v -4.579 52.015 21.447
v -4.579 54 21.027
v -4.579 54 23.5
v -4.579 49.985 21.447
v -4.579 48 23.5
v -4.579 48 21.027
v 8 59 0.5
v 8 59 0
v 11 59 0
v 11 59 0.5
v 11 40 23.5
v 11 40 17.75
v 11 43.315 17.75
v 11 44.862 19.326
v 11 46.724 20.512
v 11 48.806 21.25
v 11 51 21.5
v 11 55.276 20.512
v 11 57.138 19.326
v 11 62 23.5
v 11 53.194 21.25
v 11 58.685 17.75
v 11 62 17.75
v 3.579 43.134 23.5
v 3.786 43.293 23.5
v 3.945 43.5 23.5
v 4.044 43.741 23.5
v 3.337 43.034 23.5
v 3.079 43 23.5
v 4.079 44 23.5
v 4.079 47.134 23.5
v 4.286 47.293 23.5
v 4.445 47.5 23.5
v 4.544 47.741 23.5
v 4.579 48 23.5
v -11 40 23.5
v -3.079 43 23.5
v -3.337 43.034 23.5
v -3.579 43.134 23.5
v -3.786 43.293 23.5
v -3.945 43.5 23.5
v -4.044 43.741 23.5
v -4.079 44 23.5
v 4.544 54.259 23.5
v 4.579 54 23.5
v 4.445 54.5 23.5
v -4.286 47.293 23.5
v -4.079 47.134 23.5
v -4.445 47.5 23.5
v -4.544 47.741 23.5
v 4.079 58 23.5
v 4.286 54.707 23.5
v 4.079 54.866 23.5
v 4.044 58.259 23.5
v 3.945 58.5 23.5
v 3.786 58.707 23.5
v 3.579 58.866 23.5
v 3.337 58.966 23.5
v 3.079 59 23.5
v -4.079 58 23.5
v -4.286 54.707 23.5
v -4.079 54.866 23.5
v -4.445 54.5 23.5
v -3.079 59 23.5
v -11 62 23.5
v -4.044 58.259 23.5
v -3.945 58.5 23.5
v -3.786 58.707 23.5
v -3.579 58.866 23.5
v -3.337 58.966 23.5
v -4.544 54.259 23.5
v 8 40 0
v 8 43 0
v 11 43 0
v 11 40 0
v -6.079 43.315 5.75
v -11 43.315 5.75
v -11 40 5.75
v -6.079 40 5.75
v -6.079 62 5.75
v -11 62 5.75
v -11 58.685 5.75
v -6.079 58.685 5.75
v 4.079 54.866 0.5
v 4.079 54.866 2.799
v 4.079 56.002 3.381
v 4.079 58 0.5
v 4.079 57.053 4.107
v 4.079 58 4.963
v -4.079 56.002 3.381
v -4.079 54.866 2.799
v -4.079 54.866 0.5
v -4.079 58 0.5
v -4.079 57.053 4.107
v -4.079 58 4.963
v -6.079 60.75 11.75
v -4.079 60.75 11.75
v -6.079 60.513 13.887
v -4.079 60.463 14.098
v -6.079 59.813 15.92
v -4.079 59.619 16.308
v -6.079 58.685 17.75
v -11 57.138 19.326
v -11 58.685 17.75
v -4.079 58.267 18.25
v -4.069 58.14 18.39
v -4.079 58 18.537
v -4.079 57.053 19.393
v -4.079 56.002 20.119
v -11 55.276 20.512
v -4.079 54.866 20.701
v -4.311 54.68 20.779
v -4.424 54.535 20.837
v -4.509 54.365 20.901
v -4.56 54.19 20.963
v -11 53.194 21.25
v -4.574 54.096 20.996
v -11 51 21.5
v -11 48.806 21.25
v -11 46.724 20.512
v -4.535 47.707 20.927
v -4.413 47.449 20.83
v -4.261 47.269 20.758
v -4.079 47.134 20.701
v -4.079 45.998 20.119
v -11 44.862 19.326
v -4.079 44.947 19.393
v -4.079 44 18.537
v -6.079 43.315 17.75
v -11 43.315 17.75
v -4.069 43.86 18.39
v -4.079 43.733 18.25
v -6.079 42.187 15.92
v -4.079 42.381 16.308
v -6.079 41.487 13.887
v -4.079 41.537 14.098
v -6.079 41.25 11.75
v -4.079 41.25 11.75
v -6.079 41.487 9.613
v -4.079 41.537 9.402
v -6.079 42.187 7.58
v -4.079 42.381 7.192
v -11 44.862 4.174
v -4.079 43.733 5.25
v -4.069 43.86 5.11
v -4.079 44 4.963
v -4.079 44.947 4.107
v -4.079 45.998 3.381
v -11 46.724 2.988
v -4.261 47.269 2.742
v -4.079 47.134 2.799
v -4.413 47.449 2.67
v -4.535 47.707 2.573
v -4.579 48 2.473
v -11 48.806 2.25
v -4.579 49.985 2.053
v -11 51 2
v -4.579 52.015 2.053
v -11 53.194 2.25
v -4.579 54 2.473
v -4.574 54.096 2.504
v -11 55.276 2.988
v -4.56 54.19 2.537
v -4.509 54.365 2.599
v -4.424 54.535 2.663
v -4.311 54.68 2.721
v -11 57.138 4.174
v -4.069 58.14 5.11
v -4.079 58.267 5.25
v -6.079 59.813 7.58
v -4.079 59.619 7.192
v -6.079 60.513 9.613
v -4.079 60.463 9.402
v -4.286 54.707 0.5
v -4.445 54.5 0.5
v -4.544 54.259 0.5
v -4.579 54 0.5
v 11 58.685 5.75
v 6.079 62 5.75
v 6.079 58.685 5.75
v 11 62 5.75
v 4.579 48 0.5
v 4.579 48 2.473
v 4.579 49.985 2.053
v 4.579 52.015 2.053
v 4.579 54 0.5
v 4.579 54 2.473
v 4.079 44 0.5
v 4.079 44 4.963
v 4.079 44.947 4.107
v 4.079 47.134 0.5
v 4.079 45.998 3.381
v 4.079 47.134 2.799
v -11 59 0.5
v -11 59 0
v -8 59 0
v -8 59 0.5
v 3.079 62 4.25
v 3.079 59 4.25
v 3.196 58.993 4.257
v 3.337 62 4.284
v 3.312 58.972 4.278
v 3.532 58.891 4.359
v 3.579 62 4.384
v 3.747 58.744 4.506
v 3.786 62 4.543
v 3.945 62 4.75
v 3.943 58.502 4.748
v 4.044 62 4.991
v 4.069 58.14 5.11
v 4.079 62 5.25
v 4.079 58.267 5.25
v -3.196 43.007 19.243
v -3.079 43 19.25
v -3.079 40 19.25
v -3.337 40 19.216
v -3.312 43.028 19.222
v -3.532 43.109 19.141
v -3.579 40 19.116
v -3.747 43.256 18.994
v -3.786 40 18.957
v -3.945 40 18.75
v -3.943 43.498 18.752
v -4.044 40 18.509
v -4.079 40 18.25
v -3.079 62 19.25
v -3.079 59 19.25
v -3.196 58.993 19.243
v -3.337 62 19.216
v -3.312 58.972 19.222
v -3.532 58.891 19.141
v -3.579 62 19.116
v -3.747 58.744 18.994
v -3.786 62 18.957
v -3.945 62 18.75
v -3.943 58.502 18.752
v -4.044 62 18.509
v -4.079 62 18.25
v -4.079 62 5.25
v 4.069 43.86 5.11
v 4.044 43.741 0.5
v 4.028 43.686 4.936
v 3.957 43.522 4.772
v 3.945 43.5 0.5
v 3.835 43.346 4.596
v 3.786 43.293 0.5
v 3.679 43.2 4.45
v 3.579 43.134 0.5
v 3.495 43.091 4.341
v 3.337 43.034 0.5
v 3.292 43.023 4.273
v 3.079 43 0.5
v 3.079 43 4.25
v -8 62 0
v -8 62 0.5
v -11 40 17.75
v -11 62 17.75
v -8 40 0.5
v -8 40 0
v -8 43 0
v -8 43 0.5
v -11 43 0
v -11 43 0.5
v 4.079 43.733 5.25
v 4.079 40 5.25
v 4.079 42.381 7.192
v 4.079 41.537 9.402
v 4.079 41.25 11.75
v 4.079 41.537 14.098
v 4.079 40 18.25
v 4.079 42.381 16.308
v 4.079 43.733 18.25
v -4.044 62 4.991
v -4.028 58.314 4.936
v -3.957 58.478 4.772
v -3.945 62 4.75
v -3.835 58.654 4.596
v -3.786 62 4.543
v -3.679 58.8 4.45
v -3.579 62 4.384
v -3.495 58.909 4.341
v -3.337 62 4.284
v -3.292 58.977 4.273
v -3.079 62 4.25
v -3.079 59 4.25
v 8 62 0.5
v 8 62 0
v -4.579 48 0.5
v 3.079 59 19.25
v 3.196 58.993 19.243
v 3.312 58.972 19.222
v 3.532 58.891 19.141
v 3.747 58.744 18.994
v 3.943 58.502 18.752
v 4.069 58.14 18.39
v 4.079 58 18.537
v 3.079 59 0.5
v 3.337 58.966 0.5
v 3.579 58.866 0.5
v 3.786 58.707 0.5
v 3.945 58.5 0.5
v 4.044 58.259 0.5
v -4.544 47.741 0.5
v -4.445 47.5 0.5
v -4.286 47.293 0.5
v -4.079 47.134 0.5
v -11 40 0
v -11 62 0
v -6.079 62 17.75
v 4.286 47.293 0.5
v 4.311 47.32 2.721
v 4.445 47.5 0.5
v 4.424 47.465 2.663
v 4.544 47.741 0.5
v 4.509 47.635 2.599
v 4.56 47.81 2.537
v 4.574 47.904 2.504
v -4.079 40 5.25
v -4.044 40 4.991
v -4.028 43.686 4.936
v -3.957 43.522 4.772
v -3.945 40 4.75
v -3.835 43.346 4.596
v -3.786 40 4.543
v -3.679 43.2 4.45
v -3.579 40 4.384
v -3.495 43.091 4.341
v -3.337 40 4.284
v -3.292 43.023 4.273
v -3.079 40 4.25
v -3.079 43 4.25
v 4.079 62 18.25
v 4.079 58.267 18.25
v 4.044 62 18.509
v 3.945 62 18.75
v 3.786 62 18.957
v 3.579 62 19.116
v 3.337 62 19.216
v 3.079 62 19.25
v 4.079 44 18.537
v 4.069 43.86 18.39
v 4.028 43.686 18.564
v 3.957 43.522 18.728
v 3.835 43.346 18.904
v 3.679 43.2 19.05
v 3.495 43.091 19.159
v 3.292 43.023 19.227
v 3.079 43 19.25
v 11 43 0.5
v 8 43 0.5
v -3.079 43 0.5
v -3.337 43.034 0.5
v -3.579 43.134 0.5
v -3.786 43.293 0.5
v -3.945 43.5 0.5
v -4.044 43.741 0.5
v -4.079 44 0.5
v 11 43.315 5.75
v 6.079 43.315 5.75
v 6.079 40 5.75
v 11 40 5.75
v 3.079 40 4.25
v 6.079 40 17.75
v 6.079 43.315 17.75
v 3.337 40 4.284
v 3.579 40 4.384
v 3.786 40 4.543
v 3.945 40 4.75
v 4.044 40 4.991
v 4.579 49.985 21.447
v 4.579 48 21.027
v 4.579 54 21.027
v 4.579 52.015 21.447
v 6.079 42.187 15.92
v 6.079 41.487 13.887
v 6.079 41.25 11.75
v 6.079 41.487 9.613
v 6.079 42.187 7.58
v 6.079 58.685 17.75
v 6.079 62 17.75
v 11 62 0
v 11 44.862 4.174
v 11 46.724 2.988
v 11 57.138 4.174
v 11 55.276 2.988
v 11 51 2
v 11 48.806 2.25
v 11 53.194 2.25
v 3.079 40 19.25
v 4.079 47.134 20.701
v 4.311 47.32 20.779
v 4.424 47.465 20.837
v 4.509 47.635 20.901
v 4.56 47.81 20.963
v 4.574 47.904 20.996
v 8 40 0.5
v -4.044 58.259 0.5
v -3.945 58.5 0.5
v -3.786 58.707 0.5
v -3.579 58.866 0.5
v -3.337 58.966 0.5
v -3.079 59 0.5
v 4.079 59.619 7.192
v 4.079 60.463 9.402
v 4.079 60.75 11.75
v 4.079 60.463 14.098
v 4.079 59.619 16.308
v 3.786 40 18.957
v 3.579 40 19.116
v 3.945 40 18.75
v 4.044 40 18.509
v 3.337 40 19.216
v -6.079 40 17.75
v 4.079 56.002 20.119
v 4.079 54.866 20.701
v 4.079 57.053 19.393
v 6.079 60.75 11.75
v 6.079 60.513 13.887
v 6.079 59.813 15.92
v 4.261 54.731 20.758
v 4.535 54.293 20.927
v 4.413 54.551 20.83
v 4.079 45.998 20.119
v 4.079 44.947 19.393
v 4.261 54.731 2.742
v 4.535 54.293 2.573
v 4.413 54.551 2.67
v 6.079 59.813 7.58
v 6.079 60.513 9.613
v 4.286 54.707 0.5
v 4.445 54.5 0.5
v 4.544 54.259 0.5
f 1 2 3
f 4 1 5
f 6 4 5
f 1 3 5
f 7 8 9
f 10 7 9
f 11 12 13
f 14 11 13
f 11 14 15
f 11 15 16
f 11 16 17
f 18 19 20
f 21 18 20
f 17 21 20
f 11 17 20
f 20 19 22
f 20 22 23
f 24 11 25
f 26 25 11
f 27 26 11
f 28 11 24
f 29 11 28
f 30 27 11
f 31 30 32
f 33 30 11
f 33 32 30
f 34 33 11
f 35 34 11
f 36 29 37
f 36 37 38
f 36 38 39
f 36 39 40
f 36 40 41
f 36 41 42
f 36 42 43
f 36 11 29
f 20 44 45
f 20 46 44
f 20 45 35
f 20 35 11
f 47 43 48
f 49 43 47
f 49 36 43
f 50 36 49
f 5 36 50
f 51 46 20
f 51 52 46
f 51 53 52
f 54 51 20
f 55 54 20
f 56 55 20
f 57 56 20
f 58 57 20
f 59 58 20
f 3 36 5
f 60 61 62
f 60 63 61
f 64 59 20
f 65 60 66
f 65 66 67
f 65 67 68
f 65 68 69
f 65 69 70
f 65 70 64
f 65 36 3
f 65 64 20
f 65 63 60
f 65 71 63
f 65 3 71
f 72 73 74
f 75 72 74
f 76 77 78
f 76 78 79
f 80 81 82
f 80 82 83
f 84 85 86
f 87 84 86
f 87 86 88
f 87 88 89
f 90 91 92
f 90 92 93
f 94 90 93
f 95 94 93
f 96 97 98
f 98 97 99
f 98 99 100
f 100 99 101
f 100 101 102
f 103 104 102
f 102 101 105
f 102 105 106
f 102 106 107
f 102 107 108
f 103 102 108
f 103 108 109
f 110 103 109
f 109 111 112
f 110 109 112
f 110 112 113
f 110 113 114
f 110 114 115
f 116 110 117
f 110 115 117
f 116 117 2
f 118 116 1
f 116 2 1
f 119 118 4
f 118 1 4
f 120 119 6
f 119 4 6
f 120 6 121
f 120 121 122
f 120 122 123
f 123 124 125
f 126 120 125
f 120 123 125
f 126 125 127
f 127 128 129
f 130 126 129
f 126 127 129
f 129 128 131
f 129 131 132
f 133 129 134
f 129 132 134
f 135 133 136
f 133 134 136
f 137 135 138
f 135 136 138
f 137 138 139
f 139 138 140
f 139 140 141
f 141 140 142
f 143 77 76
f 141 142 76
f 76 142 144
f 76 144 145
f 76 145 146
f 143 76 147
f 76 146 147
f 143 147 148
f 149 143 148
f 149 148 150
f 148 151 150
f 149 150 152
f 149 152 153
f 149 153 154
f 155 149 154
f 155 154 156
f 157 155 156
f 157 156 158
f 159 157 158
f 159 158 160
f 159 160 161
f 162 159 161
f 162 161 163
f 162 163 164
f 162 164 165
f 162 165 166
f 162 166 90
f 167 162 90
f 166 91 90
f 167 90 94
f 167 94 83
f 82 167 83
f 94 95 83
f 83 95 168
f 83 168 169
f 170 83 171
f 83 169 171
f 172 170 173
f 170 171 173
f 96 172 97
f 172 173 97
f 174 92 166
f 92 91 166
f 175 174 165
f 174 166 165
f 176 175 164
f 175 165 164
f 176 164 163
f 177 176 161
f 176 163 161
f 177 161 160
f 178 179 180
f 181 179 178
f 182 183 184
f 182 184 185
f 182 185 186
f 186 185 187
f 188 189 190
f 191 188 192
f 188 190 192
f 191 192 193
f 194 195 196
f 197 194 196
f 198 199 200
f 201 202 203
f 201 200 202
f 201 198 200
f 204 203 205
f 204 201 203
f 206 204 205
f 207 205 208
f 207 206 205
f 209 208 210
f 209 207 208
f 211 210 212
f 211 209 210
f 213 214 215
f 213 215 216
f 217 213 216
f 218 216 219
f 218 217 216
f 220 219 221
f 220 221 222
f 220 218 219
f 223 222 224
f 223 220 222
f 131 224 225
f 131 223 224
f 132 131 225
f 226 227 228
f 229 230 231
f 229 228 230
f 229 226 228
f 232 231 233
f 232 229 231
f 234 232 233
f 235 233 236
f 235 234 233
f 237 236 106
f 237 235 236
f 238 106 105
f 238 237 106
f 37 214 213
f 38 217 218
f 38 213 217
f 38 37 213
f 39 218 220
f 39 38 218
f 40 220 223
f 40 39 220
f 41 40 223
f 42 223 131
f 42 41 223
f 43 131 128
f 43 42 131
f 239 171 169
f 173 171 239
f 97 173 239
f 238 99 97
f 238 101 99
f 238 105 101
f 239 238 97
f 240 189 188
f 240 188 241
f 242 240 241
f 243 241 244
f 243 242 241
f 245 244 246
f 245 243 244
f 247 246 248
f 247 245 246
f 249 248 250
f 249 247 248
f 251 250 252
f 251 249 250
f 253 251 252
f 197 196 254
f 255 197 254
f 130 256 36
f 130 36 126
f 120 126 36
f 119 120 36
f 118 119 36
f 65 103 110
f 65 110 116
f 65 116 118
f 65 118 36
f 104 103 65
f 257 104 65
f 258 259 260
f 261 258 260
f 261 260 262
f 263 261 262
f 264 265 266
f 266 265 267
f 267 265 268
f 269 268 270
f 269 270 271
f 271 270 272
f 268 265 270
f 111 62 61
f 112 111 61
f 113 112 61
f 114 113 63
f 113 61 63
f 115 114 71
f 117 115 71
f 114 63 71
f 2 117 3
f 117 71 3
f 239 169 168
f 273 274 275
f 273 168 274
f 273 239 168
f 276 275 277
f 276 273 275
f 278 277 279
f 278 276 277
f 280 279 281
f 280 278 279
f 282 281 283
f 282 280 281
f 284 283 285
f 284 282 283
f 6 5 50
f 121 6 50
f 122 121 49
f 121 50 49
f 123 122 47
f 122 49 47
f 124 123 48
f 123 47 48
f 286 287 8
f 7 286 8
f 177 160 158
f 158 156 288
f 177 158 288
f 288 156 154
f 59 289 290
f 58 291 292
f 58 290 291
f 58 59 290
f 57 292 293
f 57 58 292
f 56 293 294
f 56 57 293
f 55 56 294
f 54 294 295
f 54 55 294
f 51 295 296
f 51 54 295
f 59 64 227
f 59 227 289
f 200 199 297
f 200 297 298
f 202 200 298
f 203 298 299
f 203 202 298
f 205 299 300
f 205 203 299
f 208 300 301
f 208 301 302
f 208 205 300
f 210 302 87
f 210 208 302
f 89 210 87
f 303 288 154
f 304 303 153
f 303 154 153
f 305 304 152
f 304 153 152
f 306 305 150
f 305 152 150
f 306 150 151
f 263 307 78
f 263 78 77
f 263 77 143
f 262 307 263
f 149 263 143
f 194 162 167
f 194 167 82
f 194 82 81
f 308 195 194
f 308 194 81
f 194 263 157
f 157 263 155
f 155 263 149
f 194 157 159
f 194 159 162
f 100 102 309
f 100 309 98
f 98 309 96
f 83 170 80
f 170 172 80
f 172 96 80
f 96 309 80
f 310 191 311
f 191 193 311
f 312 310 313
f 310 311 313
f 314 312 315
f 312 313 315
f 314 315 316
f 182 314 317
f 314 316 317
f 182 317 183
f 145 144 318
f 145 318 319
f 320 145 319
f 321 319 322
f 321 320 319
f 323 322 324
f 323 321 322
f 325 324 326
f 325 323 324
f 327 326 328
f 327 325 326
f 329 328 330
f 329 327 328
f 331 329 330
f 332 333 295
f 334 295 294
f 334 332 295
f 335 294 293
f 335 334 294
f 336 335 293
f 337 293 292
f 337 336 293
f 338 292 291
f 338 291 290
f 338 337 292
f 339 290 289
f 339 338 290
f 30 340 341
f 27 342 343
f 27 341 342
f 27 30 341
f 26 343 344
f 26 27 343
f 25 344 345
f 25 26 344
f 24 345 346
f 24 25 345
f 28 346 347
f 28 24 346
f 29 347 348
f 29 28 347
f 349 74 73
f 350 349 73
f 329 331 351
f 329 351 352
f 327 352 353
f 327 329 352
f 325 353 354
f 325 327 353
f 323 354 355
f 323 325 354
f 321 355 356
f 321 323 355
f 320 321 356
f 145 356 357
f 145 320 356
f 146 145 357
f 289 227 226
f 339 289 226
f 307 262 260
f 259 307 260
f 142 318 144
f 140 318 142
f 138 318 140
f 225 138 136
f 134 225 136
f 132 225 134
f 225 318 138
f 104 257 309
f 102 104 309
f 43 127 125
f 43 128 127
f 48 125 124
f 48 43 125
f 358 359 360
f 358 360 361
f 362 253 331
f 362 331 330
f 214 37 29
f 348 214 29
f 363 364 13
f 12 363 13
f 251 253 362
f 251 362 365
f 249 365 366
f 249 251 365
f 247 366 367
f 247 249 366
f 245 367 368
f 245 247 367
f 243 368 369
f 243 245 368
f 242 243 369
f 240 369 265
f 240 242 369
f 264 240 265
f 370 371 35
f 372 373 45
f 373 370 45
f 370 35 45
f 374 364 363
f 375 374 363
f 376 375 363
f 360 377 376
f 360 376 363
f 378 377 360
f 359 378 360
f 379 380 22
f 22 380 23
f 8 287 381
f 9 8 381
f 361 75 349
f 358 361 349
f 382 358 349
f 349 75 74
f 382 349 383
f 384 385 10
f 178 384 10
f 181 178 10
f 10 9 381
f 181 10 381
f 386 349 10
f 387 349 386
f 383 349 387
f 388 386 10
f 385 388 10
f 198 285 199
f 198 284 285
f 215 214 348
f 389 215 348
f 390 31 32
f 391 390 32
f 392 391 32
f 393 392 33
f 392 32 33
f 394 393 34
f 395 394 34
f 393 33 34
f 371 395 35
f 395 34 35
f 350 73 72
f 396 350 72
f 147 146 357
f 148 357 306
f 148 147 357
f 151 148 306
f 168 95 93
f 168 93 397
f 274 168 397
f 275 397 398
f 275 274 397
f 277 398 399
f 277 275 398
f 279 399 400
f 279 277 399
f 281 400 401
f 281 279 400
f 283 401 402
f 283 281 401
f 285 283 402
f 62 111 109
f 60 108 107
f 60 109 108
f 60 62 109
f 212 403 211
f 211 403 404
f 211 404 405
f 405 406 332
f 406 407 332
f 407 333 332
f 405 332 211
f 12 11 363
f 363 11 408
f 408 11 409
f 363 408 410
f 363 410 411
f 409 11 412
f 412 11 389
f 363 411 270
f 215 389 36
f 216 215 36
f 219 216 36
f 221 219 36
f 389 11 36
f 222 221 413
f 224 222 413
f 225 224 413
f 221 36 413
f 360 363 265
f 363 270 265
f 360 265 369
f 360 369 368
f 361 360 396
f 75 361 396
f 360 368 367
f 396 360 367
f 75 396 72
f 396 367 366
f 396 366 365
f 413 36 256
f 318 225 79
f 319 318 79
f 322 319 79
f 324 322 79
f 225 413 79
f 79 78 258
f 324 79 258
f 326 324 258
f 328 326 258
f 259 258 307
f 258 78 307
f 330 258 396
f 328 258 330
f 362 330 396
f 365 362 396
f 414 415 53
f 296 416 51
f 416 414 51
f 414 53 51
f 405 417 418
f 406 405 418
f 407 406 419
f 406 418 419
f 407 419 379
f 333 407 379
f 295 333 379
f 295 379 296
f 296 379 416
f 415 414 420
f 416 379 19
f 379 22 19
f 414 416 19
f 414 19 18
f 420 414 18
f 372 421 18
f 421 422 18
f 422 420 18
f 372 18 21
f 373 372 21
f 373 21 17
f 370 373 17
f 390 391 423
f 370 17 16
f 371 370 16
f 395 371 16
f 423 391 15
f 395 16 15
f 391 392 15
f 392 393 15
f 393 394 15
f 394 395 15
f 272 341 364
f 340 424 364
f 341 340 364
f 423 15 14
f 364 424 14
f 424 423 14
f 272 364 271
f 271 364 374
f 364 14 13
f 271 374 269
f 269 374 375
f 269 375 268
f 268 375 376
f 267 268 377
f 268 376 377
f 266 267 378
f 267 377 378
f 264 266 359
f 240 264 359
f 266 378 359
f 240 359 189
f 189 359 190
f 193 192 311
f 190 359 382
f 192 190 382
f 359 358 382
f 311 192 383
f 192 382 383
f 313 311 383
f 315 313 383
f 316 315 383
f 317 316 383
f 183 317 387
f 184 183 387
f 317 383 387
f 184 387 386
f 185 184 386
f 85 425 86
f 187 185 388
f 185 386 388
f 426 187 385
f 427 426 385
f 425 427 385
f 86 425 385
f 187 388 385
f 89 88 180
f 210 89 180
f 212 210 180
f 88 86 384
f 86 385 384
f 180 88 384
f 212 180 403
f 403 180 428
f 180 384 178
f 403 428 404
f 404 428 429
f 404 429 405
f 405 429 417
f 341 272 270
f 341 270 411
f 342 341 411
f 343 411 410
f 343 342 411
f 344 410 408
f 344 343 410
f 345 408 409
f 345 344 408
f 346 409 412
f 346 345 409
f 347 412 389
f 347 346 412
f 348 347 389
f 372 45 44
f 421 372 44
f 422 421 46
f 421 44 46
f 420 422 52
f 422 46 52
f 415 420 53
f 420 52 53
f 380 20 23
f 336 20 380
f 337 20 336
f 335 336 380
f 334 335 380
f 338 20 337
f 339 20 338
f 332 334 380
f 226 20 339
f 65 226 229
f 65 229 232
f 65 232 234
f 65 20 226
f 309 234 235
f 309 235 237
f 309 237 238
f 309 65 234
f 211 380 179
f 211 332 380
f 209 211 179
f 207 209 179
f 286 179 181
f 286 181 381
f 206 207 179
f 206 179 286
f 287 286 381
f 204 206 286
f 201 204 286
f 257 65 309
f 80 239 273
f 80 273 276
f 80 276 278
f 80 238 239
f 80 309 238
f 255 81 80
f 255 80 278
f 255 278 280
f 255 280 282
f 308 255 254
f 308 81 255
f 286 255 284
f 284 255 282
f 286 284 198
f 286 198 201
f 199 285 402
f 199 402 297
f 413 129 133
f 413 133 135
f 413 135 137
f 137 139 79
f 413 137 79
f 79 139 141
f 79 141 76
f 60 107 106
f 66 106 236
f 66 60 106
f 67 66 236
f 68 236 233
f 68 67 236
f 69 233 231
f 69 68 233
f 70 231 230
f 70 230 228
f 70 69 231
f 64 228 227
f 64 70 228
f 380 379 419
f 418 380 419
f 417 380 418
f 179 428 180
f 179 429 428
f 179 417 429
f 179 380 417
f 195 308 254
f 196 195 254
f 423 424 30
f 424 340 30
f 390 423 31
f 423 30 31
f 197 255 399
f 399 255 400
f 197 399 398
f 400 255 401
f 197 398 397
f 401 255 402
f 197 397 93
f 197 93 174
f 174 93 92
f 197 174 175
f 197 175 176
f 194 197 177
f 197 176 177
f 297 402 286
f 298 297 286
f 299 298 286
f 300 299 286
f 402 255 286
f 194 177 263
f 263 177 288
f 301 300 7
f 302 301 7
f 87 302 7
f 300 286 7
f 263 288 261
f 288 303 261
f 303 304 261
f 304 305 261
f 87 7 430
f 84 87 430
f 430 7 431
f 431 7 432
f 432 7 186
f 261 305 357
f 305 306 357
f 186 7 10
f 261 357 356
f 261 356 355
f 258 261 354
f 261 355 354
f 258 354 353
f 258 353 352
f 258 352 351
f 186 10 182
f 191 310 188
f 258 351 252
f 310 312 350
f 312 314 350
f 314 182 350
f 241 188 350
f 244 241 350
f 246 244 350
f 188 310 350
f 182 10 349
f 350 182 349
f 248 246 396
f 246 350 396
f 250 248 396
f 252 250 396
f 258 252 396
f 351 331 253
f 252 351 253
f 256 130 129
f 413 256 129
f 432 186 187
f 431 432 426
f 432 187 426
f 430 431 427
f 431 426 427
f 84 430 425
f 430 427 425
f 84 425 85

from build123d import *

# Parameters (mm, degrees)
SKETCH1_W           = 22
SKETCH1_H           = 22
BOSS_EXTRUDE1_DEPTH = 23.5
CUT_EXTRUDE1_REACH  = 71.859
SKETCH2_R           = 9.75
CUT_EXTRUDE2_DEPTH  = 0.5
SKETCH5_W           = 8.157122282
SKETCH5_H           = 16
CUT_EXTRUDE3_DEPTH  = 68.210490253
SKETCH6_W           = 8.157122282
SKETCH6_H           = 15
CUT_EXTRUDE4_DEPTH  = 35.018377386
SKETCH7_W           = 4.921438859
SKETCH7_H           = 12
CUT_EXTRUDE5_DEPTH  = 35.018377386
CUT_EXTRUDE6_DEPTH  = 68.210490253
FILLET1_R           = 1


with BuildPart() as part:
    # Sketch1 → Boss-Extrude1 (new body)
    with BuildSketch(Plane.XY):
        with Locations((0, 51)):
            Rectangle(SKETCH1_W, SKETCH1_H)
    extrude(amount=BOSS_EXTRUDE1_DEPTH)

    # Sketch2 → Cut-Extrude1 (cut, up to next)
    with BuildSketch(Plane(origin=(11, 0, 0), x_dir=(0, 0, -1), z_dir=(1, 0, 0)), mode=Mode.PRIVATE) as cut_extrude1_sk1:
        with Locations(Location((-11.75, 51, 0), (0, 0, 90))):
            Circle(SKETCH2_R)
    cut_extrude1_tool1 = extrude(cut_extrude1_sk1.sketch, amount=-CUT_EXTRUDE1_REACH, mode=Mode.PRIVATE) & part.part
    add(cut_extrude1_tool1.solids().sort_by_distance((11, 51, 11.75))[0], mode=Mode.SUBTRACT)

    # Sketch3 → Cut-Extrude2 (cut)
    with BuildSketch(Plane(origin=(0, 0, 0), x_dir=(-1, 0, 0), z_dir=(0, 0, -1))):
        Polygon((11, 43), (11, 59), (8, 59), (8, 62), (-8, 62), (-8, 59), (-11, 59), (-11, 43), (-8, 43), (-8, 40), (8, 40), (8, 43), align=None)
    extrude(amount=-CUT_EXTRUDE2_DEPTH, mode=Mode.SUBTRACT)

    # Sketch5 → Cut-Extrude3 (cut, through all)
    with BuildSketch(Plane.XY.offset(23.5)):
        with Locations((0, 51)):
            Rectangle(SKETCH5_W, SKETCH5_H)
    extrude(amount=-CUT_EXTRUDE3_DEPTH, mode=Mode.SUBTRACT)

    # Sketch6 → Cut-Extrude4 (cut, through all)
    with BuildSketch(Plane(origin=(0, 62, 0), x_dir=(1, 0, 0), z_dir=(0, 1, 0))):
        with Locations((0, -11.75)):
            Rectangle(SKETCH6_W, SKETCH6_H)
    extrude(amount=-CUT_EXTRUDE4_DEPTH, mode=Mode.SUBTRACT)

    # Sketch7 → Cut-Extrude5 (cut, through all)
    with BuildSketch(Plane(origin=(0, 62, 0), x_dir=(1, 0, 0), z_dir=(0, 1, 0))):
        with Locations((8.539280571, -11.75)):
            Rectangle(SKETCH7_W, SKETCH7_H)
        with Locations((-8.539280571, -11.75)):
            Rectangle(SKETCH7_W, SKETCH7_H)
    extrude(amount=-CUT_EXTRUDE5_DEPTH, mode=Mode.SUBTRACT)

    # Sketch8 → Cut-Extrude6 (cut, through all)
    with BuildSketch(Plane.XY.offset(23.5)):
        with BuildLine():
            Line((-3.578561141, 47), (3.578561141, 47))
            ThreePointArc((3.578561141, 47), (4.285667922, 47.292893219), (4.578561141, 48))
            Line((4.578561141, 48), (4.578561141, 54))
            ThreePointArc((4.578561141, 54), (4.285667922, 54.707106781), (3.578561141, 55))
            Line((3.578561141, 55), (-3.578561141, 55))
            ThreePointArc((-3.578561141, 55), (-4.285667922, 54.707106781), (-4.578561141, 54))
            Line((-4.578561141, 54), (-4.578561141, 48))
            ThreePointArc((-4.578561141, 48), (-4.285667922, 47.292893219), (-3.578561141, 47))
        make_face()
    extrude(amount=-CUT_EXTRUDE6_DEPTH, mode=Mode.SUBTRACT)

    # Fillet1
    # the kernel refuses this fillet: 1 mm, written as the material it adds along each edge
    with BuildSketch(Plane(origin=(4.078561141, 59, 4.25), x_dir=(-1, 0, 0), z_dir=(0, 0, -1)), Plane(origin=(4.078561141, 43, 4.25), x_dir=(0, 1, 0), z_dir=(0, 0, -1)), Plane(origin=(-4.078561141, 59, 4.25), x_dir=(0, -1, 0), z_dir=(0, 0, -1))) as fillet1_piece_1:
        with BuildLine():
            CenterArc((FILLET1_R, -FILLET1_R), FILLET1_R, 90, 90)
            Line((0, -FILLET1_R), (0, 0))
            Line((0, 0), (FILLET1_R, 0))
        make_face()
    extrude(amount=3.75)
    with BuildSketch(Plane(origin=(-4.078561141, 43, 4.25), x_dir=(0, 1, 0), z_dir=(0, 0, -1))) as fillet1_piece_2:
        with BuildLine():
            CenterArc((FILLET1_R, FILLET1_R), FILLET1_R, 180, 90)
            Line((0, FILLET1_R), (0, 0))
            Line((0, 0), (FILLET1_R, 0))
        make_face()
    extrude(amount=3.75)
    with BuildSketch(Plane(origin=(4.078561141, 59, 23.5), x_dir=(0, -1, 0), z_dir=(0, 0, -1)), Plane(origin=(-4.078561141, 43, 23.5), x_dir=(0, 1, 0), z_dir=(0, 0, -1))) as fillet1_piece_3:
        with BuildLine():
            CenterArc((FILLET1_R, FILLET1_R), FILLET1_R, 180, 90)
            Line((0, FILLET1_R), (0, 0))
            Line((0, 0), (FILLET1_R, 0))
        make_face()
    extrude(amount=4.25)
    with BuildSketch(Plane(origin=(-4.078561141, 59, 23.5), x_dir=(0, -1, 0), z_dir=(0, 0, -1)), Plane(origin=(4.078561141, 43, 23.5), x_dir=(0, 1, 0), z_dir=(0, 0, -1))) as fillet1_piece_4:
        with BuildLine():
            CenterArc((FILLET1_R, -FILLET1_R), FILLET1_R, 90, 90)
            Line((0, -FILLET1_R), (0, 0))
            Line((0, 0), (FILLET1_R, 0))
        make_face()
    extrude(amount=4.25)
    with BuildSketch(Plane(origin=(-4.078561141, 62, 4.25), x_dir=(0, 0, 1), z_dir=(0, -1, 0)), Plane(origin=(-4.078561141, 43, 4.25), x_dir=(0, 0, 1), z_dir=(0, -1, 0)), Plane(origin=(4.078561141, 62, 19.25), x_dir=(0, 0, -1), z_dir=(0, -1, 0)), Plane(origin=(-4.078561141, 43, 19.25), x_dir=(1, 0, 0), z_dir=(0, -1, 0))) as fillet1_piece_5:
        with BuildLine():
            CenterArc((FILLET1_R, -FILLET1_R), FILLET1_R, 90, 90)
            Line((0, -FILLET1_R), (0, 0))
            Line((0, 0), (FILLET1_R, 0))
        make_face()
    extrude(amount=3)
    with BuildSketch(Plane(origin=(4.078561141, 43, 4.25), x_dir=(0, 0, 1), z_dir=(0, -1, 0)), Plane(origin=(4.078561141, 62, 4.25), x_dir=(0, 0, 1), z_dir=(0, -1, 0)), Plane(origin=(4.078561141, 43, 19.25), x_dir=(-1, 0, 0), z_dir=(0, -1, 0)), Plane(origin=(-4.078561141, 62, 19.25), x_dir=(0, 0, -1), z_dir=(0, -1, 0))) as fillet1_piece_6:
        with BuildLine():
            CenterArc((FILLET1_R, FILLET1_R), FILLET1_R, 180, 90)
            Line((0, FILLET1_R), (0, 0))
            Line((0, 0), (FILLET1_R, 0))
        make_face()
    extrude(amount=3)
    with BuildSketch(Plane(origin=(4.078561141, 59, 6.75), x_dir=(-1, 0, 0), z_dir=(0, 0, -1))) as fillet1_piece_7a_section:
        with BuildLine():
            CenterArc((FILLET1_R, -FILLET1_R), FILLET1_R, 90, 90)
            Line((0, -FILLET1_R), (0, 0))
            Line((0, 0), (FILLET1_R, 0))
        make_face()
    fillet1_piece_7a = extrude(amount=6.25, mode=Mode.PRIVATE)
    fillet1_piece_7a = split(fillet1_piece_7a, bisect_by=Plane(origin=(3.830285127, 58.809985628, 4.25), z_dir=(0, 0, 1)), keep=Keep.TOP, mode=Mode.PRIVATE)
    fillet1_piece_7a = fillet1_piece_7a - Plane(origin=(3.830285127, 51, 11.75), x_dir=(0, 1, 0), z_dir=(1, 0, 0)) * Cylinder(9.75, 17, mode=Mode.PRIVATE)
    with BuildSketch(Plane(origin=(4.078561141, 62, 4.25), x_dir=(0, 0, 1), z_dir=(0, -1, 0))) as fillet1_piece_7b_section:
        with BuildLine():
            CenterArc((FILLET1_R, FILLET1_R), FILLET1_R, 180, 90)
            Line((0, FILLET1_R), (0, 0))
            Line((0, 0), (FILLET1_R, 0))
        make_face()
    fillet1_piece_7b = extrude(amount=5.5, mode=Mode.PRIVATE)
    fillet1_piece_7b = split(fillet1_piece_7b, bisect_by=Plane(origin=(3.832225581, 59, 4.443177498), z_dir=(0, -1, 0)), keep=Keep.TOP, mode=Mode.PRIVATE)
    fillet1_piece_7b = fillet1_piece_7b - Plane(origin=(3.832225581, 51, 11.75), x_dir=(0, 1, 0), z_dir=(1, 0, 0)) * Cylinder(9.75, 15, mode=Mode.PRIVATE)
    fillet1_piece_7 = fillet1_piece_7a & fillet1_piece_7b
    add(fillet1_piece_7)
    with BuildSketch(Plane(origin=(4.078561141, 43, 6.75), x_dir=(0, 1, 0), z_dir=(0, 0, -1))) as fillet1_piece_8a_section:
        with BuildLine():
            CenterArc((FILLET1_R, -FILLET1_R), FILLET1_R, 90, 90)
            Line((0, -FILLET1_R), (0, 0))
            Line((0, 0), (FILLET1_R, 0))
        make_face()
    fillet1_piece_8a = extrude(amount=6.25, mode=Mode.PRIVATE)
    fillet1_piece_8a = fillet1_piece_8a - Plane(origin=(3.830283996, 51, 11.75), x_dir=(0, 1, 0), z_dir=(1, 0, 0)) * Cylinder(9.75, 17, mode=Mode.PRIVATE)
    fillet1_piece_8a = split(fillet1_piece_8a, bisect_by=Plane(origin=(3.830283996, 43.190015611, 4.25), z_dir=(0, 0, 1)), keep=Keep.TOP, mode=Mode.PRIVATE)
    with BuildSketch(Plane(origin=(4.078561141, 45.5, 4.25), x_dir=(0, 0, 1), z_dir=(0, -1, 0))) as fillet1_piece_8b_section:
        with BuildLine():
            CenterArc((FILLET1_R, FILLET1_R), FILLET1_R, 180, 90)
            Line((0, FILLET1_R), (0, 0))
            Line((0, 0), (FILLET1_R, 0))
        make_face()
    fillet1_piece_8b = extrude(amount=5.5, mode=Mode.PRIVATE)
    fillet1_piece_8b = fillet1_piece_8b - Plane(origin=(3.832225993, 51, 11.75), x_dir=(0, 1, 0), z_dir=(1, 0, 0)) * Cylinder(9.75, 15, mode=Mode.PRIVATE)
    fillet1_piece_8b = split(fillet1_piece_8b, bisect_by=Plane(origin=(3.832225993, 43, 4.443177034), z_dir=(0, 1, 0)), keep=Keep.TOP, mode=Mode.PRIVATE)
    fillet1_piece_8 = fillet1_piece_8a & fillet1_piece_8b
    add(fillet1_piece_8)
    with BuildSketch(Plane(origin=(-4.078561141, 45.5, 4.25), x_dir=(0, 0, 1), z_dir=(0, -1, 0))) as fillet1_piece_9a_section:
        with BuildLine():
            CenterArc((FILLET1_R, -FILLET1_R), FILLET1_R, 90, 90)
            Line((0, -FILLET1_R), (0, 0))
            Line((0, 0), (FILLET1_R, 0))
        make_face()
    fillet1_piece_9a = extrude(amount=5.5, mode=Mode.PRIVATE)
    fillet1_piece_9a = fillet1_piece_9a - Plane(origin=(-3.832225993, 51, 11.75), x_dir=(0, 1, 0), z_dir=(1, 0, 0)) * Cylinder(9.75, 15, mode=Mode.PRIVATE)
    fillet1_piece_9a = split(fillet1_piece_9a, bisect_by=Plane(origin=(-3.832225993, 43, 4.443177034), z_dir=(0, 1, 0)), keep=Keep.TOP, mode=Mode.PRIVATE)
    with BuildSketch(Plane(origin=(-4.078561141, 43, 6.75), x_dir=(0, 1, 0), z_dir=(0, 0, -1))) as fillet1_piece_9b_section:
        with BuildLine():
            CenterArc((FILLET1_R, FILLET1_R), FILLET1_R, 180, 90)
            Line((0, FILLET1_R), (0, 0))
            Line((0, 0), (FILLET1_R, 0))
        make_face()
    fillet1_piece_9b = extrude(amount=6.25, mode=Mode.PRIVATE)
    fillet1_piece_9b = fillet1_piece_9b - Plane(origin=(-3.830283996, 51, 11.75), x_dir=(0, 1, 0), z_dir=(1, 0, 0)) * Cylinder(9.75, 17, mode=Mode.PRIVATE)
    fillet1_piece_9b = split(fillet1_piece_9b, bisect_by=Plane(origin=(-3.830283996, 43.190015611, 4.25), z_dir=(0, 0, 1)), keep=Keep.TOP, mode=Mode.PRIVATE)
    fillet1_piece_9 = fillet1_piece_9a & fillet1_piece_9b
    add(fillet1_piece_9)
    with BuildSketch(Plane(origin=(-4.078561141, 59, 6.75), x_dir=(0, -1, 0), z_dir=(0, 0, -1))) as fillet1_piece_10a_section:
        with BuildLine():
            CenterArc((FILLET1_R, -FILLET1_R), FILLET1_R, 90, 90)
            Line((0, -FILLET1_R), (0, 0))
            Line((0, 0), (FILLET1_R, 0))
        make_face()
    fillet1_piece_10a = extrude(amount=6.25, mode=Mode.PRIVATE)
    fillet1_piece_10a = fillet1_piece_10a - Plane(origin=(-3.830284938, 51, 11.75), x_dir=(0, 1, 0), z_dir=(1, 0, 0)) * Cylinder(9.75, 17, mode=Mode.PRIVATE)
    fillet1_piece_10a = split(fillet1_piece_10a, bisect_by=Plane(origin=(-3.830284938, 58.80998536, 4.25), z_dir=(0, 0, 1)), keep=Keep.TOP, mode=Mode.PRIVATE)
    with BuildSketch(Plane(origin=(-4.078561141, 62, 4.25), x_dir=(0, 0, 1), z_dir=(0, -1, 0))) as fillet1_piece_10b_section:
        with BuildLine():
            CenterArc((FILLET1_R, -FILLET1_R), FILLET1_R, 90, 90)
            Line((0, -FILLET1_R), (0, 0))
            Line((0, 0), (FILLET1_R, 0))
        make_face()
    fillet1_piece_10b = extrude(amount=5.5, mode=Mode.PRIVATE)
    fillet1_piece_10b = fillet1_piece_10b - Plane(origin=(-3.832225581, 51, 11.75), x_dir=(0, 1, 0), z_dir=(1, 0, 0)) * Cylinder(9.75, 15, mode=Mode.PRIVATE)
    fillet1_piece_10b = split(fillet1_piece_10b, bisect_by=Plane(origin=(-3.832225581, 59, 4.443177498), z_dir=(0, -1, 0)), keep=Keep.TOP, mode=Mode.PRIVATE)
    fillet1_piece_10 = fillet1_piece_10a & fillet1_piece_10b
    add(fillet1_piece_10)
    with BuildSketch(Plane(origin=(4.078561141, 59, 23.5), x_dir=(0, -1, 0), z_dir=(0, 0, -1))) as fillet1_piece_11a_section:
        with BuildLine():
            CenterArc((FILLET1_R, FILLET1_R), FILLET1_R, 180, 90)
            Line((0, FILLET1_R), (0, 0))
            Line((0, 0), (FILLET1_R, 0))
        make_face()
    fillet1_piece_11a = extrude(amount=6.75, mode=Mode.PRIVATE)
    fillet1_piece_11a = fillet1_piece_11a - Plane(origin=(3.830283996, 51, 11.75), x_dir=(0, 1, 0), z_dir=(1, 0, 0)) * Cylinder(9.75, 18, mode=Mode.PRIVATE)
    fillet1_piece_11a = split(fillet1_piece_11a, bisect_by=Plane(origin=(3.830283996, 58.80998439, 19.25), z_dir=(0, 0, -1)), keep=Keep.TOP, mode=Mode.PRIVATE)
    with BuildSketch(Plane(origin=(4.078561141, 62, 19.25), x_dir=(0, 0, -1), z_dir=(0, -1, 0))) as fillet1_piece_11b_section:
        with BuildLine():
            CenterArc((FILLET1_R, -FILLET1_R), FILLET1_R, 90, 90)
            Line((0, -FILLET1_R), (0, 0))
            Line((0, 0), (FILLET1_R, 0))
        make_face()
    fillet1_piece_11b = extrude(amount=5.5, mode=Mode.PRIVATE)
    fillet1_piece_11b = fillet1_piece_11b - Plane(origin=(3.832225993, 51, 11.75), x_dir=(0, 1, 0), z_dir=(1, 0, 0)) * Cylinder(9.75, 15, mode=Mode.PRIVATE)
    fillet1_piece_11b = split(fillet1_piece_11b, bisect_by=Plane(origin=(3.832225993, 59, 19.056822966), z_dir=(0, -1, 0)), keep=Keep.TOP, mode=Mode.PRIVATE)
    fillet1_piece_11 = fillet1_piece_11a & fillet1_piece_11b
    add(fillet1_piece_11)
    with BuildSketch(Plane(origin=(-4.078561141, 62, 19.25), x_dir=(0, 0, -1), z_dir=(0, -1, 0))) as fillet1_piece_12a_section:
        with BuildLine():
            CenterArc((FILLET1_R, FILLET1_R), FILLET1_R, 180, 90)
            Line((0, FILLET1_R), (0, 0))
            Line((0, 0), (FILLET1_R, 0))
        make_face()
    fillet1_piece_12a = extrude(amount=5.5, mode=Mode.PRIVATE)
    fillet1_piece_12a = fillet1_piece_12a - Plane(origin=(-3.832225993, 51, 11.75), x_dir=(0, 1, 0), z_dir=(1, 0, 0)) * Cylinder(9.75, 15, mode=Mode.PRIVATE)
    fillet1_piece_12a = split(fillet1_piece_12a, bisect_by=Plane(origin=(-3.832225993, 59, 19.056822966), z_dir=(0, -1, 0)), keep=Keep.TOP, mode=Mode.PRIVATE)
    with BuildSketch(Plane(origin=(-4.078561141, 59, 23.5), x_dir=(0, -1, 0), z_dir=(0, 0, -1))) as fillet1_piece_12b_section:
        with BuildLine():
            CenterArc((FILLET1_R, -FILLET1_R), FILLET1_R, 90, 90)
            Line((0, -FILLET1_R), (0, 0))
            Line((0, 0), (FILLET1_R, 0))
        make_face()
    fillet1_piece_12b = extrude(amount=6.75, mode=Mode.PRIVATE)
    fillet1_piece_12b = fillet1_piece_12b - Plane(origin=(-3.830283996, 51, 11.75), x_dir=(0, 1, 0), z_dir=(1, 0, 0)) * Cylinder(9.75, 18, mode=Mode.PRIVATE)
    fillet1_piece_12b = split(fillet1_piece_12b, bisect_by=Plane(origin=(-3.830283996, 58.809984389, 19.25), z_dir=(0, 0, -1)), keep=Keep.TOP, mode=Mode.PRIVATE)
    fillet1_piece_12 = fillet1_piece_12a & fillet1_piece_12b
    add(fillet1_piece_12)
    with BuildSketch(Plane(origin=(-4.078561141, 45.5, 19.25), x_dir=(1, 0, 0), z_dir=(0, -1, 0))) as fillet1_piece_13a_section:
        with BuildLine():
            CenterArc((FILLET1_R, -FILLET1_R), FILLET1_R, 90, 90)
            Line((0, -FILLET1_R), (0, 0))
            Line((0, 0), (FILLET1_R, 0))
        make_face()
    fillet1_piece_13a = extrude(amount=5.5, mode=Mode.PRIVATE)
    fillet1_piece_13a = split(fillet1_piece_13a, bisect_by=Plane(origin=(-3.832225691, 43, 19.056822612), z_dir=(0, 1, 0)), keep=Keep.TOP, mode=Mode.PRIVATE)
    fillet1_piece_13a = fillet1_piece_13a - Plane(origin=(-3.832225691, 51, 11.75), x_dir=(0, 1, 0), z_dir=(1, 0, 0)) * Cylinder(9.75, 15, mode=Mode.PRIVATE)
    with BuildSketch(Plane(origin=(-4.078561141, 43, 23.5), x_dir=(0, 1, 0), z_dir=(0, 0, -1))) as fillet1_piece_13b_section:
        with BuildLine():
            CenterArc((FILLET1_R, FILLET1_R), FILLET1_R, 180, 90)
            Line((0, FILLET1_R), (0, 0))
            Line((0, 0), (FILLET1_R, 0))
        make_face()
    fillet1_piece_13b = extrude(amount=6.75, mode=Mode.PRIVATE)
    fillet1_piece_13b = split(fillet1_piece_13b, bisect_by=Plane(origin=(-3.830284938, 43.190014641, 19.25), z_dir=(0, 0, -1)), keep=Keep.TOP, mode=Mode.PRIVATE)
    fillet1_piece_13b = fillet1_piece_13b - Plane(origin=(-3.830284938, 51, 11.75), x_dir=(0, 1, 0), z_dir=(1, 0, 0)) * Cylinder(9.75, 18, mode=Mode.PRIVATE)
    fillet1_piece_13 = fillet1_piece_13a & fillet1_piece_13b
    add(fillet1_piece_13)
    with BuildSketch(Plane(origin=(4.078561141, 45.5, 19.25), x_dir=(-1, 0, 0), z_dir=(0, -1, 0))) as fillet1_piece_14a_section:
        with BuildLine():
            CenterArc((FILLET1_R, FILLET1_R), FILLET1_R, 180, 90)
            Line((0, FILLET1_R), (0, 0))
            Line((0, 0), (FILLET1_R, 0))
        make_face()
    fillet1_piece_14a = extrude(amount=5.5, mode=Mode.PRIVATE)
    fillet1_piece_14a = split(fillet1_piece_14a, bisect_by=Plane(origin=(3.832225691, 43, 19.056822612), z_dir=(0, 1, 0)), keep=Keep.TOP, mode=Mode.PRIVATE)
    fillet1_piece_14a = fillet1_piece_14a - Plane(origin=(3.832225691, 51, 11.75), x_dir=(0, 1, 0), z_dir=(1, 0, 0)) * Cylinder(9.75, 15, mode=Mode.PRIVATE)
    with BuildSketch(Plane(origin=(4.078561141, 43, 23.5), x_dir=(0, 1, 0), z_dir=(0, 0, -1))) as fillet1_piece_14b_section:
        with BuildLine():
            CenterArc((FILLET1_R, -FILLET1_R), FILLET1_R, 90, 90)
            Line((0, -FILLET1_R), (0, 0))
            Line((0, 0), (FILLET1_R, 0))
        make_face()
    fillet1_piece_14b = extrude(amount=6.75, mode=Mode.PRIVATE)
    fillet1_piece_14b = split(fillet1_piece_14b, bisect_by=Plane(origin=(3.830284938, 43.190014641, 19.25), z_dir=(0, 0, -1)), keep=Keep.TOP, mode=Mode.PRIVATE)
    fillet1_piece_14b = fillet1_piece_14b - Plane(origin=(3.830284938, 51, 11.75), x_dir=(0, 1, 0), z_dir=(1, 0, 0)) * Cylinder(9.75, 18, mode=Mode.PRIVATE)
    fillet1_piece_14 = fillet1_piece_14a & fillet1_piece_14b
    add(fillet1_piece_14)


solid = part.part
